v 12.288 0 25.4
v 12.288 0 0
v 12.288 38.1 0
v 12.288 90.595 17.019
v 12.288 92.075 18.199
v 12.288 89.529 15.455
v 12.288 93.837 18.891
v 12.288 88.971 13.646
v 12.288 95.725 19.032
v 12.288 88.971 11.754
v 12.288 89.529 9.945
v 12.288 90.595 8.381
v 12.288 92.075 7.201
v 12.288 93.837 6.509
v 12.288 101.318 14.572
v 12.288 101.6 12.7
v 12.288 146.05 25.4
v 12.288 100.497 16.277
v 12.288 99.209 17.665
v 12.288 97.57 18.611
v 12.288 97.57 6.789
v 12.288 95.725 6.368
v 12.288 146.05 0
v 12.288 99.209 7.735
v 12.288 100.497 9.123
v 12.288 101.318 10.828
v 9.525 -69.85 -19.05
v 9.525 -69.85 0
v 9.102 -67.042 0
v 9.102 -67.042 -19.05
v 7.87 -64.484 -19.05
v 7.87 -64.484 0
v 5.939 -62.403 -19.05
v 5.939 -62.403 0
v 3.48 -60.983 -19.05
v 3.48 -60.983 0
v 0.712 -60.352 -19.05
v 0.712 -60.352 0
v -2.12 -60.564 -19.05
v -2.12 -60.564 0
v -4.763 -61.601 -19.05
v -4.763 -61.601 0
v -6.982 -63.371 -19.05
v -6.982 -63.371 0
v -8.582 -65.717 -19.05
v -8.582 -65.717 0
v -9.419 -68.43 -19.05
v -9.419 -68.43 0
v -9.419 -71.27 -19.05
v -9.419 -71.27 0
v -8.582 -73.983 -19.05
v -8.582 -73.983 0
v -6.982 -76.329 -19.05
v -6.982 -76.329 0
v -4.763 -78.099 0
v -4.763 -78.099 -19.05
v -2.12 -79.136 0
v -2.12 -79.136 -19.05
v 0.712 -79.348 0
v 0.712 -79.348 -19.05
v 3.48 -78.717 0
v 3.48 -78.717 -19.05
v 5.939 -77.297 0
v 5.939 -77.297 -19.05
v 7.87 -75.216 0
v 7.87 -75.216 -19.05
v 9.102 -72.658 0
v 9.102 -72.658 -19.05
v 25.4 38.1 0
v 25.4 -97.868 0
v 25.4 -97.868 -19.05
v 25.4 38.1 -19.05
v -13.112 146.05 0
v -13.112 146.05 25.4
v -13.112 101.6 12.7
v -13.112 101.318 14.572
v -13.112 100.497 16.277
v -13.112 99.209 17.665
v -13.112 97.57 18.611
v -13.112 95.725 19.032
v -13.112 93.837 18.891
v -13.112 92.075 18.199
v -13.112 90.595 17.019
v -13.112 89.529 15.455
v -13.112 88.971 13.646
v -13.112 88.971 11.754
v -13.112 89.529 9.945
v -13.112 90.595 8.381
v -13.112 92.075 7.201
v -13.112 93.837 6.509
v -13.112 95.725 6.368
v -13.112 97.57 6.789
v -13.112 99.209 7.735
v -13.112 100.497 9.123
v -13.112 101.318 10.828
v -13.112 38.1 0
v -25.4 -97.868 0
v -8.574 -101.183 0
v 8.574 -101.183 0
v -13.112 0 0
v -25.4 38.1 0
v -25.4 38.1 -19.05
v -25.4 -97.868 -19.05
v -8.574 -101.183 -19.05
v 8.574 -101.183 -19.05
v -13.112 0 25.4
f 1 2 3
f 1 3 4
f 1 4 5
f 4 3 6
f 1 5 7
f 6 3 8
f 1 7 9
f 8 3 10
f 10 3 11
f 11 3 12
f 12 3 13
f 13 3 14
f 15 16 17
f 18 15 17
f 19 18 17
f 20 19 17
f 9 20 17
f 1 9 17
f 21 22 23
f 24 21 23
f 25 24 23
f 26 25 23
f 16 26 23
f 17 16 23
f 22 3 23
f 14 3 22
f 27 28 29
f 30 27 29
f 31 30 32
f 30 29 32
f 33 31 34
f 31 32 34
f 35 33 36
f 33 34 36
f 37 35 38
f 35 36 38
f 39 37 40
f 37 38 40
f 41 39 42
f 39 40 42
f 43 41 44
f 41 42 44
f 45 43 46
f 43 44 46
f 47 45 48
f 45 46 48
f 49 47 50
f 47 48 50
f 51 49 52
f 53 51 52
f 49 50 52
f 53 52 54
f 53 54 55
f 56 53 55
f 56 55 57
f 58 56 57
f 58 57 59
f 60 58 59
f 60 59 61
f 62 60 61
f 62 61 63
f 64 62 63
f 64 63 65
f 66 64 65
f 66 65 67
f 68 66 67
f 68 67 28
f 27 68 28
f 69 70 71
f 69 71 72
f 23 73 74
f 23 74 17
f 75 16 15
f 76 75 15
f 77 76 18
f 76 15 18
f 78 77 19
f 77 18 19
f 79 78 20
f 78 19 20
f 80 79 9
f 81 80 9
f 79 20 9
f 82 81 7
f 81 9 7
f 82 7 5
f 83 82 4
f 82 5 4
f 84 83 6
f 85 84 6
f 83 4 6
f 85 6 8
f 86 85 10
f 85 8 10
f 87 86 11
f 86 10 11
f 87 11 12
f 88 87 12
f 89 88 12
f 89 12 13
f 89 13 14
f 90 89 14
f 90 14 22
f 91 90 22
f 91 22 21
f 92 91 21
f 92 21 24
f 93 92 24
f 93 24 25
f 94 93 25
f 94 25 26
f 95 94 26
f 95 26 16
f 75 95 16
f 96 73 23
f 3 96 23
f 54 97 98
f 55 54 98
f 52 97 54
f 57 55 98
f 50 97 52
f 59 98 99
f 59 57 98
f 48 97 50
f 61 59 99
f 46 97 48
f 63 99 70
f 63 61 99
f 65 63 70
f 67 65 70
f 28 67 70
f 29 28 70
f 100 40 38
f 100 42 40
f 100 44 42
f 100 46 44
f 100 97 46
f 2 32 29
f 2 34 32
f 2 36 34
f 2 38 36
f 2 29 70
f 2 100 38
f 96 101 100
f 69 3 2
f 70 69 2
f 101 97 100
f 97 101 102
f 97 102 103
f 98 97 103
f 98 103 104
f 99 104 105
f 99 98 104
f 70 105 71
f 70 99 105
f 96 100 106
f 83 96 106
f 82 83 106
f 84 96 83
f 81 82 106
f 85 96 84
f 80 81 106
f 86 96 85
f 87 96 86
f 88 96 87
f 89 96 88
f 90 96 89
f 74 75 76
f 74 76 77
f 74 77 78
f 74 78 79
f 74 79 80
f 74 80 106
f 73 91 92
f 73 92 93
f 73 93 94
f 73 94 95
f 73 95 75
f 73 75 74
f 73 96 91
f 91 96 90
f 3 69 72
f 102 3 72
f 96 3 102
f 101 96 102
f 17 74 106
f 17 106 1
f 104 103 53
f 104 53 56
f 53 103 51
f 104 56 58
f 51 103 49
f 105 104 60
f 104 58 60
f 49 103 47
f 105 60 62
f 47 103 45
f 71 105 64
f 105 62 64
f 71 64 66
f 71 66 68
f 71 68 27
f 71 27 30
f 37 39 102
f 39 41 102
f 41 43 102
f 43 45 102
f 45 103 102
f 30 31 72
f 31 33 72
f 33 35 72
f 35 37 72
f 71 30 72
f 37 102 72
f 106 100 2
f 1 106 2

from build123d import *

# Parameters (mm, degrees)
F0_W     = 25.4
F0_H     = 146.05
F1_DEPTH = 25.4
F3_DEPTH = 19.05
F4_R     = 6.35
F5_DEPTH = 37.689491
F6_R     = 9.525
F7_DEPTH = 25.4


with BuildPart() as f1:
    # F0 (on Top) → F1 (new body)
    with BuildSketch(Plane.XY):
        with Locations((-0.411509, 73.025)):
            Rectangle(F0_W, F0_H)
    extrude(amount=F1_DEPTH)

    # F2 (on Top) → F3 (join)
    with BuildSketch(Plane.XY):
        with BuildLine():
            Line((25.4, 38.1), (0, 38.1))
            Line((0, 38.1), (-25.4, 38.1))
            Line((-25.4, 38.1), (-25.4, -97.86834))
            ThreePointArc((-25.4, -97.86834), (0, -101.6), (25.4, -97.86834))
            Line((25.4, -97.86834), (25.4, 38.1))
        make_face()
    extrude(amount=-F3_DEPTH)

    # F4 (on face) → F5 (cut, through all)
    with BuildSketch(Plane.YZ.offset(12.288491)):
        with Locations((95.25, 12.7)):
            Circle(F4_R)
    extrude(amount=-F5_DEPTH, mode=Mode.SUBTRACT)

    # F6 (on face) → F7 (cut)
    with BuildSketch(Plane.XY):
        with Locations((0, -69.85)):
            Circle(F6_R)
    extrude(amount=-F7_DEPTH, mode=Mode.SUBTRACT)


solid = f1.part
